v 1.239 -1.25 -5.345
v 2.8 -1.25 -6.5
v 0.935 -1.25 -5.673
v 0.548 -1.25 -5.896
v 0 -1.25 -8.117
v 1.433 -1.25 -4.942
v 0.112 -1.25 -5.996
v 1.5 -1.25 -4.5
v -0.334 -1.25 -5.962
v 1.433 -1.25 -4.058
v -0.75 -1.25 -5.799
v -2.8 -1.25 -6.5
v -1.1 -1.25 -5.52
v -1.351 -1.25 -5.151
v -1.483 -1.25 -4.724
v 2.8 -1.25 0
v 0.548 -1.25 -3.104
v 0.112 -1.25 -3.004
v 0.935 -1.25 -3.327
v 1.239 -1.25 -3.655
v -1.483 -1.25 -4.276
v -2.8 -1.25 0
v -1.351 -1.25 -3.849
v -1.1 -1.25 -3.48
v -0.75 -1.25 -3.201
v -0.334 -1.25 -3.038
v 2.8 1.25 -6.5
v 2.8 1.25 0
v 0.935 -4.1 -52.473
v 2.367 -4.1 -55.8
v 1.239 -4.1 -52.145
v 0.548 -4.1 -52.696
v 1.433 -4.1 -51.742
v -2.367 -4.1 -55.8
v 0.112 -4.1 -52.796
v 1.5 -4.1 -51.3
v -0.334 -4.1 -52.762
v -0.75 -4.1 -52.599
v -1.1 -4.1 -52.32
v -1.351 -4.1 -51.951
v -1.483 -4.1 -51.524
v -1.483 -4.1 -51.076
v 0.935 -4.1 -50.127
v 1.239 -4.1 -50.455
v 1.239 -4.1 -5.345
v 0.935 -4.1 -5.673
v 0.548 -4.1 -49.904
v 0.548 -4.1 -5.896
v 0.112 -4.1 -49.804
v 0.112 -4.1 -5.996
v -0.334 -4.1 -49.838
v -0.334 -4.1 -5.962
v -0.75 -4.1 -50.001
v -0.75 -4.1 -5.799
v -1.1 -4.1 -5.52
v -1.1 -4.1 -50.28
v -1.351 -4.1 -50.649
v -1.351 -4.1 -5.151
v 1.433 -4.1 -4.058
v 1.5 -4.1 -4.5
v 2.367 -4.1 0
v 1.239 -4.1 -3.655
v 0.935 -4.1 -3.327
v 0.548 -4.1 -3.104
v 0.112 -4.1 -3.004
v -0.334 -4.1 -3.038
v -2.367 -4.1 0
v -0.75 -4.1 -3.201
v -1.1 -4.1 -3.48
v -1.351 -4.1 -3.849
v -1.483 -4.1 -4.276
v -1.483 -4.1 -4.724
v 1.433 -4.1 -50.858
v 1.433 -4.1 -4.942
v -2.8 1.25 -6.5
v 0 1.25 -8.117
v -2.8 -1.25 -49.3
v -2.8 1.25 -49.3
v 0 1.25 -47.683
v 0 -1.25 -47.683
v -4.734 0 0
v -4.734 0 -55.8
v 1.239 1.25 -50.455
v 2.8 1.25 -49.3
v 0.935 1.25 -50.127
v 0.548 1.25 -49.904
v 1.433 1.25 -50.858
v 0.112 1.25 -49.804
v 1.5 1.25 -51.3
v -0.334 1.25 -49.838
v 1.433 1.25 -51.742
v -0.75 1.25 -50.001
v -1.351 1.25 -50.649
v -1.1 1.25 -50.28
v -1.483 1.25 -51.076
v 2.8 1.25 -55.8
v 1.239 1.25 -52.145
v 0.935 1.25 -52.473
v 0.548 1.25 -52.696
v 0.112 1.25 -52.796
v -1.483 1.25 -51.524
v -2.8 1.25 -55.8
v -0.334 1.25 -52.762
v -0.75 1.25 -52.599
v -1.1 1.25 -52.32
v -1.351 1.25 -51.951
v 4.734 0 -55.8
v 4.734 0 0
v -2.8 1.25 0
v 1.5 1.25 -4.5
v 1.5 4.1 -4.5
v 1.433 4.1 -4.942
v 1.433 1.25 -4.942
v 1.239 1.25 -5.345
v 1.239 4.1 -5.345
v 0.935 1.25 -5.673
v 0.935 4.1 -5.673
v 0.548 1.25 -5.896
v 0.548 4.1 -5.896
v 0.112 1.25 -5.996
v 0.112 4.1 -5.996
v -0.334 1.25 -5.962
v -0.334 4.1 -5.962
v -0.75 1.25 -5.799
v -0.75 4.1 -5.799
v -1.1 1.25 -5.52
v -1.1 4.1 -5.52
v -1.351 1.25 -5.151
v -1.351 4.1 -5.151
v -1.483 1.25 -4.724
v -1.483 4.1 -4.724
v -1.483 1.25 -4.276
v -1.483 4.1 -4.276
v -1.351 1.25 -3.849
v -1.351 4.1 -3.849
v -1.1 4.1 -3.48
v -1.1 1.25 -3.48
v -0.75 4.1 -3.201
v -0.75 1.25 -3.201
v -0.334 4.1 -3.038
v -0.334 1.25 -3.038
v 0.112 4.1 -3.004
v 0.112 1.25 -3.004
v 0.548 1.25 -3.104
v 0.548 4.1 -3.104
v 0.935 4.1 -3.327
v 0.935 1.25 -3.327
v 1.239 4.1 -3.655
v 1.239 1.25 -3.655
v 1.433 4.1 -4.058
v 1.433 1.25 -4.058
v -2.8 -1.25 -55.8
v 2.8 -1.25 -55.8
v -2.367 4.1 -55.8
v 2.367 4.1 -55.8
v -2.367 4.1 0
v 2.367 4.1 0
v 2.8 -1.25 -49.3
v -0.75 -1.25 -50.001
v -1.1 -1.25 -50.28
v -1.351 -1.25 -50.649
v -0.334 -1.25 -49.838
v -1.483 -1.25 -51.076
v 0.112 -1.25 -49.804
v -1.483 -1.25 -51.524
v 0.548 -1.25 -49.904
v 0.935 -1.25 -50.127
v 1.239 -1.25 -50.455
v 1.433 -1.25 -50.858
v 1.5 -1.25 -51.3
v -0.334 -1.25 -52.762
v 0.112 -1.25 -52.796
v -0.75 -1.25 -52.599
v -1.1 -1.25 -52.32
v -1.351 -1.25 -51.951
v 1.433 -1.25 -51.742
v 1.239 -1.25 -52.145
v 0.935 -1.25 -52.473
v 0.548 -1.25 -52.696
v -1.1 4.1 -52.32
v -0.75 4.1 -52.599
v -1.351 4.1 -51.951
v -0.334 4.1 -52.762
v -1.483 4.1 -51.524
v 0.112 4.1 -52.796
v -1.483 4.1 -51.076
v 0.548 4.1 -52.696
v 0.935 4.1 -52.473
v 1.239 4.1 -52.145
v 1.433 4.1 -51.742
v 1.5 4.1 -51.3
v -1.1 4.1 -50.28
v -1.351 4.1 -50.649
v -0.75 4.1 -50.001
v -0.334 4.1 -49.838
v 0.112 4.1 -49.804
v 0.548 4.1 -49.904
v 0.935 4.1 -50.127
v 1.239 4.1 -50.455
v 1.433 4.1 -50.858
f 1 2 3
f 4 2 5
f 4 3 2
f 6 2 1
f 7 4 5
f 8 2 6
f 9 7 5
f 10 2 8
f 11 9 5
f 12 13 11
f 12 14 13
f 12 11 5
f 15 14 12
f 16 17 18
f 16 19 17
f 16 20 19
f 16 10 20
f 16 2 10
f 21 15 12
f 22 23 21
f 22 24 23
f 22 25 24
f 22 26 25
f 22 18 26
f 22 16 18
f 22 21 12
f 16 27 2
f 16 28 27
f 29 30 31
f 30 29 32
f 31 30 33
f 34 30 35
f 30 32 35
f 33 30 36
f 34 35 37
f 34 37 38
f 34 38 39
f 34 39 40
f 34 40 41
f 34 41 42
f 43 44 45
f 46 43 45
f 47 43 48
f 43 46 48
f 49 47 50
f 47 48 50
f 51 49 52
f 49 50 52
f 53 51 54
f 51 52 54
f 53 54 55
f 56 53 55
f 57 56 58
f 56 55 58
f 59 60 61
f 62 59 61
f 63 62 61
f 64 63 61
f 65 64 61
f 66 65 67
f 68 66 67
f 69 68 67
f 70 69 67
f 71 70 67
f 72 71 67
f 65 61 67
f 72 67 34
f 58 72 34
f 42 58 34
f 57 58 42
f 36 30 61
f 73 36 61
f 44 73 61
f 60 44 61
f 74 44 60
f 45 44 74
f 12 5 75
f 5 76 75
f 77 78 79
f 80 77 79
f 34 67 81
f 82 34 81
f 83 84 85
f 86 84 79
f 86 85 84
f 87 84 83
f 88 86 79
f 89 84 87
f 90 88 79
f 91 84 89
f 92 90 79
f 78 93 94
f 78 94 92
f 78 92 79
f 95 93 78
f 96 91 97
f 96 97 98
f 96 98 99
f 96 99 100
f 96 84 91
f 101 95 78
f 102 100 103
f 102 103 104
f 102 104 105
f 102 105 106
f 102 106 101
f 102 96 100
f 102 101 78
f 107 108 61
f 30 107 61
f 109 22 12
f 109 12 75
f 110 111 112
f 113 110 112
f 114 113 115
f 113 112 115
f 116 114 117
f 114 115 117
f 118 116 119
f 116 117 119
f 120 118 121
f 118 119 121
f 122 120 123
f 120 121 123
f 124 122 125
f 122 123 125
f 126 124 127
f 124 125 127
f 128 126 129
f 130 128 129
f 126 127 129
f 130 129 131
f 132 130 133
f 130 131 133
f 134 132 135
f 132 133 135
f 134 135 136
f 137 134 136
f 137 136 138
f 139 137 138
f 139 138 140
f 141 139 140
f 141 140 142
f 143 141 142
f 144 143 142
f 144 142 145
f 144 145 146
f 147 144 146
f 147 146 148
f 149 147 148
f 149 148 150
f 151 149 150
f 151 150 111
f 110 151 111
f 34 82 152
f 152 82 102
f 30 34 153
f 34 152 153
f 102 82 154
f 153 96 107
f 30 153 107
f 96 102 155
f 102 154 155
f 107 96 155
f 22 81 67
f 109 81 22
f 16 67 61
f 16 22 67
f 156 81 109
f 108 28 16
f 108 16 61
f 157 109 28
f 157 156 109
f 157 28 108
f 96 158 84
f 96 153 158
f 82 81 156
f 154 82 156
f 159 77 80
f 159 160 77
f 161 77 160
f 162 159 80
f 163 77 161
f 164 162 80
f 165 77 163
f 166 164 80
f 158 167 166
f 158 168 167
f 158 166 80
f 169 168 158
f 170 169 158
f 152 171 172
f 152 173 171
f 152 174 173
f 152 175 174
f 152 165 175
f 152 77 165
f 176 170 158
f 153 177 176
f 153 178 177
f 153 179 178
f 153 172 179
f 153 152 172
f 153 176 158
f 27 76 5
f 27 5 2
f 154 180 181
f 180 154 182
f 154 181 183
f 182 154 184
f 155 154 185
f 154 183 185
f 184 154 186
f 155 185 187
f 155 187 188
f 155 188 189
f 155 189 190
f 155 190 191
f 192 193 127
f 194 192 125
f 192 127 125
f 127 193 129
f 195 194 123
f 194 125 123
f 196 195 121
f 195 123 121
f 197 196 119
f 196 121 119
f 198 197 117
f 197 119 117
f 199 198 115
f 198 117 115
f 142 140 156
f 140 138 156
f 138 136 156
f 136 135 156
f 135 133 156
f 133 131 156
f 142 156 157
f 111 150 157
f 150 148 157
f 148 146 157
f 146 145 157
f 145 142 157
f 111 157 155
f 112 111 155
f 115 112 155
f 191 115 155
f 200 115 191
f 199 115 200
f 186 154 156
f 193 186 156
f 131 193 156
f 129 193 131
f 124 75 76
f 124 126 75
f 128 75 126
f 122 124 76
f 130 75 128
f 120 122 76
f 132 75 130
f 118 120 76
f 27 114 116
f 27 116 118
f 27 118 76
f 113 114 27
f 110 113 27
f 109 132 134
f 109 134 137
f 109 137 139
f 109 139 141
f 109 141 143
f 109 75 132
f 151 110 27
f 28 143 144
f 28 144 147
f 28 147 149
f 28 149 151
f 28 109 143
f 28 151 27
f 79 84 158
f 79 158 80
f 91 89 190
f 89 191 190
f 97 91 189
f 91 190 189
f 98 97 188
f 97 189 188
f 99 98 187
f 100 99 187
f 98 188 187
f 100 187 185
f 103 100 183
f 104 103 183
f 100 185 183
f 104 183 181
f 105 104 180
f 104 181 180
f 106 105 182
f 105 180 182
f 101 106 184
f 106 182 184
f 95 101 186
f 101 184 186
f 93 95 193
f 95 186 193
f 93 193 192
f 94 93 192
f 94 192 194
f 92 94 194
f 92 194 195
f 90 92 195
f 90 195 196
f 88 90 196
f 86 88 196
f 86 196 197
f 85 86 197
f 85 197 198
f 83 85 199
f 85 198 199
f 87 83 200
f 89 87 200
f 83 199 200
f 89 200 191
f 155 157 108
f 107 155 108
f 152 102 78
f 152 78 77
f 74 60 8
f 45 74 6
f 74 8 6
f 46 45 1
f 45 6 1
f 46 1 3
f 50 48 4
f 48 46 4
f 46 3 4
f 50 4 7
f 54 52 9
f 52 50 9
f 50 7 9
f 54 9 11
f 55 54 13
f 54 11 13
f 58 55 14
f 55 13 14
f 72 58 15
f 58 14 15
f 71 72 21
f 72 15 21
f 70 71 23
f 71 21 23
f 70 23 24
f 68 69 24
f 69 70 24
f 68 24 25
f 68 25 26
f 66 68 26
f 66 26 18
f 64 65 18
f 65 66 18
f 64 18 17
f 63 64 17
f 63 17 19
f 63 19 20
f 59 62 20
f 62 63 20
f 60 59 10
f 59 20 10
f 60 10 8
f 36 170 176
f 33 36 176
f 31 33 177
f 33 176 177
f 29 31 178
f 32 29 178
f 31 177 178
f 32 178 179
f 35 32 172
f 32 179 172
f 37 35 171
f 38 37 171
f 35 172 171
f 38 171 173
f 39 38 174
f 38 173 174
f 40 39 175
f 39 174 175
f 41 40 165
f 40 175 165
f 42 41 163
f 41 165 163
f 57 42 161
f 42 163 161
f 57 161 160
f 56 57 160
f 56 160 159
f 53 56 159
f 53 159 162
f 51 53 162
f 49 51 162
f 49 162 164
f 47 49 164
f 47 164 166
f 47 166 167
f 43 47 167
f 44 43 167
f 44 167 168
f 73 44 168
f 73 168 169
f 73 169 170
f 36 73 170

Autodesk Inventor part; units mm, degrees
ref_plane "YZ Plane" through (0, 0, 0) normal (1, 0, 0) x (0, 1, 0)
ref_plane "XZ Plane" through (0, 0, 0) normal (0, 1, 0) x (-1, 0, 0)
sketch "Sketch1" plane through (0, 0, 0) normal (0, 0, 1) x (1, 0, 0)
  line L0 (-2.3671, -4.1) -> (-4.7343, 0)
  line L1 (-4.7343, 0) -> (-2.3671, 4.1)
  line L2 (-2.3671, 4.1) -> (2.3671, 4.1)
  line L3 (2.3671, 4.1) -> (4.7343, 0)
  line L4 (4.7343, 0) -> (2.3671, -4.1)
  line L5 (2.3671, -4.1) -> (-2.3671, -4.1)
  point P0 (0, 0)
  point P1 (0, 0)
  dimension "d0" = 4.1
extrude "Extrusion1" add sketch "Sketch1" against normal blind 55.8
sketch "Sketch2" plane through (4.7343, 0, 0) normal (0.866, 0.5, 0) x (0, 0, -1)
  line L0 (0, 4.7343) -> (0, 0) projected
  line L1 (4.75, 5.1671) -> (7.25, 5.1671)
  line L2 (7.25, 5.1671) -> (7.25, -0.4329)
  line L3 (7.25, -0.4329) -> (4.75, -0.4329)
  line L4 (4.75, -0.4329) -> (4.75, 5.1671)
  line L5 (4.75, 5.1671) -> (7.25, -0.4329) construction
  line L6 (7.25, 5.1671) -> (4.75, -0.4329) construction
  point P0 (0, 2.3671)
  point P1 (6, 2.3671)
  dimension "d3" = 2.5
  dimension "d4" = 5.6
  dimension "d10" = 0
  dimension "d11" = 6
extrude "Extrusion2" [suppressed]
sketch "Sketch3" plane through (0, 0, 0) normal (0, 0, 1) x (1, 0, 0)
  circle A0 centre (0, 0) radius 1.5
  dimension "d7" = 3
extrude "Extrusion3" [suppressed]
ref_plane "Work Plane1" through (0, 0, -27.9) normal (0, 0, -1) x (-1, 0, 0)
mirror "Mirror1" [suppressed]
sketch "Sketch4" plane through (1.5014, 4.1, -7.25) normal (0, 0, 1) x (1, 0, 0)
  line L0 (0, 0) -> (-4.5469, -2.6251) projected
  line L1 (-1.7469, -7.4749) -> (-4.5469, -2.6251) projected
  line L2 (2.8, -4.8497) -> (-1.7469, -7.4749) projected
  line L3 (-4.5469, -2.6251) -> (-4.5469, -5.8583)
  line L4 (-1.7469, -7.4749) -> (-4.5469, -5.8583)
  line L5 (-1.7469, -7.4749) -> (-4.5469, -2.6251)
  point P0 (-1.5014, -4.1)
  dimension "d12" = 120
  dimension "d13" = 120
extrude "Extrusion4" [suppressed]
sketch "Sketch5" plane through (-4.7343, 0, -55.8) normal (-0.866, -0.5, 0) x (0, 0, 1)
  line L0 (0, -4.7343) -> (0, 0) projected
  line L1 (4.75, 0.4331) -> (7.25, 0.4331)
  line L2 (7.25, 0.4331) -> (7.25, -5.1669)
  line L3 (7.25, -5.1669) -> (4.75, -5.1669)
  line L4 (4.75, -5.1669) -> (4.75, 0.4331)
  line L5 (4.75, 0.4331) -> (7.25, -5.1669) construction
  line L6 (7.25, 0.4331) -> (4.75, -5.1669) construction
  line L7 (0, -3.8671) -> (0, -0.8671) projected
  line L8 (0, -4.7343) -> (0, 0) projected
  line L9 (0, 0) -> (0, 2.3671) projected
  line L10 (0, 2.3671) -> (0, 0) projected
  line L11 (0, 0) -> (0, -4.7343) projected
  line L12 (0, -4.7343) -> (0, -7.1014) projected
  line L13 (0, -7.1014) -> (0, -4.7343) projected
  line L14 (9.5, -0.8671) -> (9.5, -3.8671) projected
  line L15 (0, -3.8671) -> (0, -0.8671) projected
  line L16 (55.8, -7.1014) -> (0, -7.1014) projected
  line L17 (55.8, 2.3671) -> (0, 2.3671) projected
  point P0 (55.8, -2.3671)
  point P1 (6, -2.3669)
  dimension "d16" = 2.5
  dimension "d17" = 5.6
  dimension "d18" = 6
  dimension "d25" = 1.9345
extrude "Extrusion5" [suppressed]
sketch "Sketch6" plane through (-1.5019, -4.1, -42.75) normal (0, 0, -1) x (-1, 0, 0)
  line L0 (-1.7472, 7.4751) -> (-4.5472, 2.6253) projected
  line L1 (-4.5472, 2.6253) -> (-4.5472, 5.8585)
  line L2 (-1.7472, 7.4751) -> (-4.5472, 5.8585)
  line L3 (2.7993, 4.8501) -> (-1.7472, 7.4751) projected
  line L4 (0, 0) -> (-4.5472, 2.6253) projected
  line L5 (-1.7472, 7.4751) -> (-4.5472, 2.6253)
  point P0 (-1.5019, 4.1)
  dimension "d21" = 120
  dimension "d22" = 120
extrude "Extrusion6" [suppressed]
sketch "Sketch8" plane through (0, 0, -55.8) normal (0, 0, -1) x (-1, 0, 0)
  line L0 (-2.8, 1.25) -> (2.8, 1.25)
  line L1 (2.8, 1.25) -> (2.8, -1.25)
  line L2 (2.8, -1.25) -> (-2.8, -1.25)
  line L3 (-2.8, -1.25) -> (-2.8, 1.25)
  line L4 (-2.8, 1.25) -> (2.8, -1.25) construction
  line L5 (2.8, 1.25) -> (-2.8, -1.25) construction
  point P0 (0, 0)
  dimension "d32" = 5.6
  dimension "d33" = 2.5
  dimension "d46" = 1.25
  dimension "d47" = 2.8
extrude "Extrusion8" cut sketch "Sketch8" against normal blind 6.5
sketch "Sketch9" plane through (-2.3671, 4.1, 0) normal (0, 1, 0) x (1, 0, 0)
  line L0 (4.7343, 0) -> (4.7343, 55.8) projected
  line L1 (0, 55.8) -> (4.7343, 55.8) projected
  line L2 (0, 0) -> (0, 55.8) projected
  line L3 (0, 0) -> (4.7343, 0) projected
  line L4 (5.1671, 55.8) -> (-0.4329, 55.8) projected
  line L5 (2.3671, 55.8) -> (2.3671, 0) construction
  line L6 (2.3671, 55.8) -> (58.1671, 55.8) construction
  circle A0 centre (2.3671, 51.3) radius 1.5
  dimension "d36" = 90
  dimension "d37" = 3
  dimension "d38" = 0
  dimension "d39" = 4.5
extrude "Extrusion9" cut sketch "Sketch9" against normal up to surface (8.2 mm away) contours A0
sketch "Sketch10" plane through (-2.8, 1.25, -55.8) normal (0, -1, 0) x (1, 0, 0)
  circle A0 centre (2.8, 4.5) radius 1.5 projected
  line L0 (5.6, 0) -> (0, 0) projected
  line L1 (5.6, 0) -> (5.6, 6.5) projected
  line L2 (5.6, 6.5) -> (0, 6.5) projected
  line L3 (0, 0) -> (0, 6.5) projected
  line L4 (0, 6.5) -> (2.8, 8.1166)
  line L5 (0, 6.5) -> (3.9156, 6.5) construction
  line L6 (5.6, 6.5) -> (2.8, 8.1166)
  line L7 (5.6, 6.5) -> (8.8332, 6.5) construction
  line L8 (5.6, 6.5) -> (0, 6.5)
  point P0 (2.8, 55.8)
  dimension "d42" = 30
  dimension "d43" = 150
extrude "Extrusion10" cut sketch "Sketch10" along normal blind 2.5 contours L2 L4 L6
mirror "Mirror3" about plane through (0, 0, -27.9) normal (0, 0, -1) of "Extrusion8", "Extrusion9", "Extrusion10"
properties part number "SupportFirstToSecond" material "ABS Plastic"
